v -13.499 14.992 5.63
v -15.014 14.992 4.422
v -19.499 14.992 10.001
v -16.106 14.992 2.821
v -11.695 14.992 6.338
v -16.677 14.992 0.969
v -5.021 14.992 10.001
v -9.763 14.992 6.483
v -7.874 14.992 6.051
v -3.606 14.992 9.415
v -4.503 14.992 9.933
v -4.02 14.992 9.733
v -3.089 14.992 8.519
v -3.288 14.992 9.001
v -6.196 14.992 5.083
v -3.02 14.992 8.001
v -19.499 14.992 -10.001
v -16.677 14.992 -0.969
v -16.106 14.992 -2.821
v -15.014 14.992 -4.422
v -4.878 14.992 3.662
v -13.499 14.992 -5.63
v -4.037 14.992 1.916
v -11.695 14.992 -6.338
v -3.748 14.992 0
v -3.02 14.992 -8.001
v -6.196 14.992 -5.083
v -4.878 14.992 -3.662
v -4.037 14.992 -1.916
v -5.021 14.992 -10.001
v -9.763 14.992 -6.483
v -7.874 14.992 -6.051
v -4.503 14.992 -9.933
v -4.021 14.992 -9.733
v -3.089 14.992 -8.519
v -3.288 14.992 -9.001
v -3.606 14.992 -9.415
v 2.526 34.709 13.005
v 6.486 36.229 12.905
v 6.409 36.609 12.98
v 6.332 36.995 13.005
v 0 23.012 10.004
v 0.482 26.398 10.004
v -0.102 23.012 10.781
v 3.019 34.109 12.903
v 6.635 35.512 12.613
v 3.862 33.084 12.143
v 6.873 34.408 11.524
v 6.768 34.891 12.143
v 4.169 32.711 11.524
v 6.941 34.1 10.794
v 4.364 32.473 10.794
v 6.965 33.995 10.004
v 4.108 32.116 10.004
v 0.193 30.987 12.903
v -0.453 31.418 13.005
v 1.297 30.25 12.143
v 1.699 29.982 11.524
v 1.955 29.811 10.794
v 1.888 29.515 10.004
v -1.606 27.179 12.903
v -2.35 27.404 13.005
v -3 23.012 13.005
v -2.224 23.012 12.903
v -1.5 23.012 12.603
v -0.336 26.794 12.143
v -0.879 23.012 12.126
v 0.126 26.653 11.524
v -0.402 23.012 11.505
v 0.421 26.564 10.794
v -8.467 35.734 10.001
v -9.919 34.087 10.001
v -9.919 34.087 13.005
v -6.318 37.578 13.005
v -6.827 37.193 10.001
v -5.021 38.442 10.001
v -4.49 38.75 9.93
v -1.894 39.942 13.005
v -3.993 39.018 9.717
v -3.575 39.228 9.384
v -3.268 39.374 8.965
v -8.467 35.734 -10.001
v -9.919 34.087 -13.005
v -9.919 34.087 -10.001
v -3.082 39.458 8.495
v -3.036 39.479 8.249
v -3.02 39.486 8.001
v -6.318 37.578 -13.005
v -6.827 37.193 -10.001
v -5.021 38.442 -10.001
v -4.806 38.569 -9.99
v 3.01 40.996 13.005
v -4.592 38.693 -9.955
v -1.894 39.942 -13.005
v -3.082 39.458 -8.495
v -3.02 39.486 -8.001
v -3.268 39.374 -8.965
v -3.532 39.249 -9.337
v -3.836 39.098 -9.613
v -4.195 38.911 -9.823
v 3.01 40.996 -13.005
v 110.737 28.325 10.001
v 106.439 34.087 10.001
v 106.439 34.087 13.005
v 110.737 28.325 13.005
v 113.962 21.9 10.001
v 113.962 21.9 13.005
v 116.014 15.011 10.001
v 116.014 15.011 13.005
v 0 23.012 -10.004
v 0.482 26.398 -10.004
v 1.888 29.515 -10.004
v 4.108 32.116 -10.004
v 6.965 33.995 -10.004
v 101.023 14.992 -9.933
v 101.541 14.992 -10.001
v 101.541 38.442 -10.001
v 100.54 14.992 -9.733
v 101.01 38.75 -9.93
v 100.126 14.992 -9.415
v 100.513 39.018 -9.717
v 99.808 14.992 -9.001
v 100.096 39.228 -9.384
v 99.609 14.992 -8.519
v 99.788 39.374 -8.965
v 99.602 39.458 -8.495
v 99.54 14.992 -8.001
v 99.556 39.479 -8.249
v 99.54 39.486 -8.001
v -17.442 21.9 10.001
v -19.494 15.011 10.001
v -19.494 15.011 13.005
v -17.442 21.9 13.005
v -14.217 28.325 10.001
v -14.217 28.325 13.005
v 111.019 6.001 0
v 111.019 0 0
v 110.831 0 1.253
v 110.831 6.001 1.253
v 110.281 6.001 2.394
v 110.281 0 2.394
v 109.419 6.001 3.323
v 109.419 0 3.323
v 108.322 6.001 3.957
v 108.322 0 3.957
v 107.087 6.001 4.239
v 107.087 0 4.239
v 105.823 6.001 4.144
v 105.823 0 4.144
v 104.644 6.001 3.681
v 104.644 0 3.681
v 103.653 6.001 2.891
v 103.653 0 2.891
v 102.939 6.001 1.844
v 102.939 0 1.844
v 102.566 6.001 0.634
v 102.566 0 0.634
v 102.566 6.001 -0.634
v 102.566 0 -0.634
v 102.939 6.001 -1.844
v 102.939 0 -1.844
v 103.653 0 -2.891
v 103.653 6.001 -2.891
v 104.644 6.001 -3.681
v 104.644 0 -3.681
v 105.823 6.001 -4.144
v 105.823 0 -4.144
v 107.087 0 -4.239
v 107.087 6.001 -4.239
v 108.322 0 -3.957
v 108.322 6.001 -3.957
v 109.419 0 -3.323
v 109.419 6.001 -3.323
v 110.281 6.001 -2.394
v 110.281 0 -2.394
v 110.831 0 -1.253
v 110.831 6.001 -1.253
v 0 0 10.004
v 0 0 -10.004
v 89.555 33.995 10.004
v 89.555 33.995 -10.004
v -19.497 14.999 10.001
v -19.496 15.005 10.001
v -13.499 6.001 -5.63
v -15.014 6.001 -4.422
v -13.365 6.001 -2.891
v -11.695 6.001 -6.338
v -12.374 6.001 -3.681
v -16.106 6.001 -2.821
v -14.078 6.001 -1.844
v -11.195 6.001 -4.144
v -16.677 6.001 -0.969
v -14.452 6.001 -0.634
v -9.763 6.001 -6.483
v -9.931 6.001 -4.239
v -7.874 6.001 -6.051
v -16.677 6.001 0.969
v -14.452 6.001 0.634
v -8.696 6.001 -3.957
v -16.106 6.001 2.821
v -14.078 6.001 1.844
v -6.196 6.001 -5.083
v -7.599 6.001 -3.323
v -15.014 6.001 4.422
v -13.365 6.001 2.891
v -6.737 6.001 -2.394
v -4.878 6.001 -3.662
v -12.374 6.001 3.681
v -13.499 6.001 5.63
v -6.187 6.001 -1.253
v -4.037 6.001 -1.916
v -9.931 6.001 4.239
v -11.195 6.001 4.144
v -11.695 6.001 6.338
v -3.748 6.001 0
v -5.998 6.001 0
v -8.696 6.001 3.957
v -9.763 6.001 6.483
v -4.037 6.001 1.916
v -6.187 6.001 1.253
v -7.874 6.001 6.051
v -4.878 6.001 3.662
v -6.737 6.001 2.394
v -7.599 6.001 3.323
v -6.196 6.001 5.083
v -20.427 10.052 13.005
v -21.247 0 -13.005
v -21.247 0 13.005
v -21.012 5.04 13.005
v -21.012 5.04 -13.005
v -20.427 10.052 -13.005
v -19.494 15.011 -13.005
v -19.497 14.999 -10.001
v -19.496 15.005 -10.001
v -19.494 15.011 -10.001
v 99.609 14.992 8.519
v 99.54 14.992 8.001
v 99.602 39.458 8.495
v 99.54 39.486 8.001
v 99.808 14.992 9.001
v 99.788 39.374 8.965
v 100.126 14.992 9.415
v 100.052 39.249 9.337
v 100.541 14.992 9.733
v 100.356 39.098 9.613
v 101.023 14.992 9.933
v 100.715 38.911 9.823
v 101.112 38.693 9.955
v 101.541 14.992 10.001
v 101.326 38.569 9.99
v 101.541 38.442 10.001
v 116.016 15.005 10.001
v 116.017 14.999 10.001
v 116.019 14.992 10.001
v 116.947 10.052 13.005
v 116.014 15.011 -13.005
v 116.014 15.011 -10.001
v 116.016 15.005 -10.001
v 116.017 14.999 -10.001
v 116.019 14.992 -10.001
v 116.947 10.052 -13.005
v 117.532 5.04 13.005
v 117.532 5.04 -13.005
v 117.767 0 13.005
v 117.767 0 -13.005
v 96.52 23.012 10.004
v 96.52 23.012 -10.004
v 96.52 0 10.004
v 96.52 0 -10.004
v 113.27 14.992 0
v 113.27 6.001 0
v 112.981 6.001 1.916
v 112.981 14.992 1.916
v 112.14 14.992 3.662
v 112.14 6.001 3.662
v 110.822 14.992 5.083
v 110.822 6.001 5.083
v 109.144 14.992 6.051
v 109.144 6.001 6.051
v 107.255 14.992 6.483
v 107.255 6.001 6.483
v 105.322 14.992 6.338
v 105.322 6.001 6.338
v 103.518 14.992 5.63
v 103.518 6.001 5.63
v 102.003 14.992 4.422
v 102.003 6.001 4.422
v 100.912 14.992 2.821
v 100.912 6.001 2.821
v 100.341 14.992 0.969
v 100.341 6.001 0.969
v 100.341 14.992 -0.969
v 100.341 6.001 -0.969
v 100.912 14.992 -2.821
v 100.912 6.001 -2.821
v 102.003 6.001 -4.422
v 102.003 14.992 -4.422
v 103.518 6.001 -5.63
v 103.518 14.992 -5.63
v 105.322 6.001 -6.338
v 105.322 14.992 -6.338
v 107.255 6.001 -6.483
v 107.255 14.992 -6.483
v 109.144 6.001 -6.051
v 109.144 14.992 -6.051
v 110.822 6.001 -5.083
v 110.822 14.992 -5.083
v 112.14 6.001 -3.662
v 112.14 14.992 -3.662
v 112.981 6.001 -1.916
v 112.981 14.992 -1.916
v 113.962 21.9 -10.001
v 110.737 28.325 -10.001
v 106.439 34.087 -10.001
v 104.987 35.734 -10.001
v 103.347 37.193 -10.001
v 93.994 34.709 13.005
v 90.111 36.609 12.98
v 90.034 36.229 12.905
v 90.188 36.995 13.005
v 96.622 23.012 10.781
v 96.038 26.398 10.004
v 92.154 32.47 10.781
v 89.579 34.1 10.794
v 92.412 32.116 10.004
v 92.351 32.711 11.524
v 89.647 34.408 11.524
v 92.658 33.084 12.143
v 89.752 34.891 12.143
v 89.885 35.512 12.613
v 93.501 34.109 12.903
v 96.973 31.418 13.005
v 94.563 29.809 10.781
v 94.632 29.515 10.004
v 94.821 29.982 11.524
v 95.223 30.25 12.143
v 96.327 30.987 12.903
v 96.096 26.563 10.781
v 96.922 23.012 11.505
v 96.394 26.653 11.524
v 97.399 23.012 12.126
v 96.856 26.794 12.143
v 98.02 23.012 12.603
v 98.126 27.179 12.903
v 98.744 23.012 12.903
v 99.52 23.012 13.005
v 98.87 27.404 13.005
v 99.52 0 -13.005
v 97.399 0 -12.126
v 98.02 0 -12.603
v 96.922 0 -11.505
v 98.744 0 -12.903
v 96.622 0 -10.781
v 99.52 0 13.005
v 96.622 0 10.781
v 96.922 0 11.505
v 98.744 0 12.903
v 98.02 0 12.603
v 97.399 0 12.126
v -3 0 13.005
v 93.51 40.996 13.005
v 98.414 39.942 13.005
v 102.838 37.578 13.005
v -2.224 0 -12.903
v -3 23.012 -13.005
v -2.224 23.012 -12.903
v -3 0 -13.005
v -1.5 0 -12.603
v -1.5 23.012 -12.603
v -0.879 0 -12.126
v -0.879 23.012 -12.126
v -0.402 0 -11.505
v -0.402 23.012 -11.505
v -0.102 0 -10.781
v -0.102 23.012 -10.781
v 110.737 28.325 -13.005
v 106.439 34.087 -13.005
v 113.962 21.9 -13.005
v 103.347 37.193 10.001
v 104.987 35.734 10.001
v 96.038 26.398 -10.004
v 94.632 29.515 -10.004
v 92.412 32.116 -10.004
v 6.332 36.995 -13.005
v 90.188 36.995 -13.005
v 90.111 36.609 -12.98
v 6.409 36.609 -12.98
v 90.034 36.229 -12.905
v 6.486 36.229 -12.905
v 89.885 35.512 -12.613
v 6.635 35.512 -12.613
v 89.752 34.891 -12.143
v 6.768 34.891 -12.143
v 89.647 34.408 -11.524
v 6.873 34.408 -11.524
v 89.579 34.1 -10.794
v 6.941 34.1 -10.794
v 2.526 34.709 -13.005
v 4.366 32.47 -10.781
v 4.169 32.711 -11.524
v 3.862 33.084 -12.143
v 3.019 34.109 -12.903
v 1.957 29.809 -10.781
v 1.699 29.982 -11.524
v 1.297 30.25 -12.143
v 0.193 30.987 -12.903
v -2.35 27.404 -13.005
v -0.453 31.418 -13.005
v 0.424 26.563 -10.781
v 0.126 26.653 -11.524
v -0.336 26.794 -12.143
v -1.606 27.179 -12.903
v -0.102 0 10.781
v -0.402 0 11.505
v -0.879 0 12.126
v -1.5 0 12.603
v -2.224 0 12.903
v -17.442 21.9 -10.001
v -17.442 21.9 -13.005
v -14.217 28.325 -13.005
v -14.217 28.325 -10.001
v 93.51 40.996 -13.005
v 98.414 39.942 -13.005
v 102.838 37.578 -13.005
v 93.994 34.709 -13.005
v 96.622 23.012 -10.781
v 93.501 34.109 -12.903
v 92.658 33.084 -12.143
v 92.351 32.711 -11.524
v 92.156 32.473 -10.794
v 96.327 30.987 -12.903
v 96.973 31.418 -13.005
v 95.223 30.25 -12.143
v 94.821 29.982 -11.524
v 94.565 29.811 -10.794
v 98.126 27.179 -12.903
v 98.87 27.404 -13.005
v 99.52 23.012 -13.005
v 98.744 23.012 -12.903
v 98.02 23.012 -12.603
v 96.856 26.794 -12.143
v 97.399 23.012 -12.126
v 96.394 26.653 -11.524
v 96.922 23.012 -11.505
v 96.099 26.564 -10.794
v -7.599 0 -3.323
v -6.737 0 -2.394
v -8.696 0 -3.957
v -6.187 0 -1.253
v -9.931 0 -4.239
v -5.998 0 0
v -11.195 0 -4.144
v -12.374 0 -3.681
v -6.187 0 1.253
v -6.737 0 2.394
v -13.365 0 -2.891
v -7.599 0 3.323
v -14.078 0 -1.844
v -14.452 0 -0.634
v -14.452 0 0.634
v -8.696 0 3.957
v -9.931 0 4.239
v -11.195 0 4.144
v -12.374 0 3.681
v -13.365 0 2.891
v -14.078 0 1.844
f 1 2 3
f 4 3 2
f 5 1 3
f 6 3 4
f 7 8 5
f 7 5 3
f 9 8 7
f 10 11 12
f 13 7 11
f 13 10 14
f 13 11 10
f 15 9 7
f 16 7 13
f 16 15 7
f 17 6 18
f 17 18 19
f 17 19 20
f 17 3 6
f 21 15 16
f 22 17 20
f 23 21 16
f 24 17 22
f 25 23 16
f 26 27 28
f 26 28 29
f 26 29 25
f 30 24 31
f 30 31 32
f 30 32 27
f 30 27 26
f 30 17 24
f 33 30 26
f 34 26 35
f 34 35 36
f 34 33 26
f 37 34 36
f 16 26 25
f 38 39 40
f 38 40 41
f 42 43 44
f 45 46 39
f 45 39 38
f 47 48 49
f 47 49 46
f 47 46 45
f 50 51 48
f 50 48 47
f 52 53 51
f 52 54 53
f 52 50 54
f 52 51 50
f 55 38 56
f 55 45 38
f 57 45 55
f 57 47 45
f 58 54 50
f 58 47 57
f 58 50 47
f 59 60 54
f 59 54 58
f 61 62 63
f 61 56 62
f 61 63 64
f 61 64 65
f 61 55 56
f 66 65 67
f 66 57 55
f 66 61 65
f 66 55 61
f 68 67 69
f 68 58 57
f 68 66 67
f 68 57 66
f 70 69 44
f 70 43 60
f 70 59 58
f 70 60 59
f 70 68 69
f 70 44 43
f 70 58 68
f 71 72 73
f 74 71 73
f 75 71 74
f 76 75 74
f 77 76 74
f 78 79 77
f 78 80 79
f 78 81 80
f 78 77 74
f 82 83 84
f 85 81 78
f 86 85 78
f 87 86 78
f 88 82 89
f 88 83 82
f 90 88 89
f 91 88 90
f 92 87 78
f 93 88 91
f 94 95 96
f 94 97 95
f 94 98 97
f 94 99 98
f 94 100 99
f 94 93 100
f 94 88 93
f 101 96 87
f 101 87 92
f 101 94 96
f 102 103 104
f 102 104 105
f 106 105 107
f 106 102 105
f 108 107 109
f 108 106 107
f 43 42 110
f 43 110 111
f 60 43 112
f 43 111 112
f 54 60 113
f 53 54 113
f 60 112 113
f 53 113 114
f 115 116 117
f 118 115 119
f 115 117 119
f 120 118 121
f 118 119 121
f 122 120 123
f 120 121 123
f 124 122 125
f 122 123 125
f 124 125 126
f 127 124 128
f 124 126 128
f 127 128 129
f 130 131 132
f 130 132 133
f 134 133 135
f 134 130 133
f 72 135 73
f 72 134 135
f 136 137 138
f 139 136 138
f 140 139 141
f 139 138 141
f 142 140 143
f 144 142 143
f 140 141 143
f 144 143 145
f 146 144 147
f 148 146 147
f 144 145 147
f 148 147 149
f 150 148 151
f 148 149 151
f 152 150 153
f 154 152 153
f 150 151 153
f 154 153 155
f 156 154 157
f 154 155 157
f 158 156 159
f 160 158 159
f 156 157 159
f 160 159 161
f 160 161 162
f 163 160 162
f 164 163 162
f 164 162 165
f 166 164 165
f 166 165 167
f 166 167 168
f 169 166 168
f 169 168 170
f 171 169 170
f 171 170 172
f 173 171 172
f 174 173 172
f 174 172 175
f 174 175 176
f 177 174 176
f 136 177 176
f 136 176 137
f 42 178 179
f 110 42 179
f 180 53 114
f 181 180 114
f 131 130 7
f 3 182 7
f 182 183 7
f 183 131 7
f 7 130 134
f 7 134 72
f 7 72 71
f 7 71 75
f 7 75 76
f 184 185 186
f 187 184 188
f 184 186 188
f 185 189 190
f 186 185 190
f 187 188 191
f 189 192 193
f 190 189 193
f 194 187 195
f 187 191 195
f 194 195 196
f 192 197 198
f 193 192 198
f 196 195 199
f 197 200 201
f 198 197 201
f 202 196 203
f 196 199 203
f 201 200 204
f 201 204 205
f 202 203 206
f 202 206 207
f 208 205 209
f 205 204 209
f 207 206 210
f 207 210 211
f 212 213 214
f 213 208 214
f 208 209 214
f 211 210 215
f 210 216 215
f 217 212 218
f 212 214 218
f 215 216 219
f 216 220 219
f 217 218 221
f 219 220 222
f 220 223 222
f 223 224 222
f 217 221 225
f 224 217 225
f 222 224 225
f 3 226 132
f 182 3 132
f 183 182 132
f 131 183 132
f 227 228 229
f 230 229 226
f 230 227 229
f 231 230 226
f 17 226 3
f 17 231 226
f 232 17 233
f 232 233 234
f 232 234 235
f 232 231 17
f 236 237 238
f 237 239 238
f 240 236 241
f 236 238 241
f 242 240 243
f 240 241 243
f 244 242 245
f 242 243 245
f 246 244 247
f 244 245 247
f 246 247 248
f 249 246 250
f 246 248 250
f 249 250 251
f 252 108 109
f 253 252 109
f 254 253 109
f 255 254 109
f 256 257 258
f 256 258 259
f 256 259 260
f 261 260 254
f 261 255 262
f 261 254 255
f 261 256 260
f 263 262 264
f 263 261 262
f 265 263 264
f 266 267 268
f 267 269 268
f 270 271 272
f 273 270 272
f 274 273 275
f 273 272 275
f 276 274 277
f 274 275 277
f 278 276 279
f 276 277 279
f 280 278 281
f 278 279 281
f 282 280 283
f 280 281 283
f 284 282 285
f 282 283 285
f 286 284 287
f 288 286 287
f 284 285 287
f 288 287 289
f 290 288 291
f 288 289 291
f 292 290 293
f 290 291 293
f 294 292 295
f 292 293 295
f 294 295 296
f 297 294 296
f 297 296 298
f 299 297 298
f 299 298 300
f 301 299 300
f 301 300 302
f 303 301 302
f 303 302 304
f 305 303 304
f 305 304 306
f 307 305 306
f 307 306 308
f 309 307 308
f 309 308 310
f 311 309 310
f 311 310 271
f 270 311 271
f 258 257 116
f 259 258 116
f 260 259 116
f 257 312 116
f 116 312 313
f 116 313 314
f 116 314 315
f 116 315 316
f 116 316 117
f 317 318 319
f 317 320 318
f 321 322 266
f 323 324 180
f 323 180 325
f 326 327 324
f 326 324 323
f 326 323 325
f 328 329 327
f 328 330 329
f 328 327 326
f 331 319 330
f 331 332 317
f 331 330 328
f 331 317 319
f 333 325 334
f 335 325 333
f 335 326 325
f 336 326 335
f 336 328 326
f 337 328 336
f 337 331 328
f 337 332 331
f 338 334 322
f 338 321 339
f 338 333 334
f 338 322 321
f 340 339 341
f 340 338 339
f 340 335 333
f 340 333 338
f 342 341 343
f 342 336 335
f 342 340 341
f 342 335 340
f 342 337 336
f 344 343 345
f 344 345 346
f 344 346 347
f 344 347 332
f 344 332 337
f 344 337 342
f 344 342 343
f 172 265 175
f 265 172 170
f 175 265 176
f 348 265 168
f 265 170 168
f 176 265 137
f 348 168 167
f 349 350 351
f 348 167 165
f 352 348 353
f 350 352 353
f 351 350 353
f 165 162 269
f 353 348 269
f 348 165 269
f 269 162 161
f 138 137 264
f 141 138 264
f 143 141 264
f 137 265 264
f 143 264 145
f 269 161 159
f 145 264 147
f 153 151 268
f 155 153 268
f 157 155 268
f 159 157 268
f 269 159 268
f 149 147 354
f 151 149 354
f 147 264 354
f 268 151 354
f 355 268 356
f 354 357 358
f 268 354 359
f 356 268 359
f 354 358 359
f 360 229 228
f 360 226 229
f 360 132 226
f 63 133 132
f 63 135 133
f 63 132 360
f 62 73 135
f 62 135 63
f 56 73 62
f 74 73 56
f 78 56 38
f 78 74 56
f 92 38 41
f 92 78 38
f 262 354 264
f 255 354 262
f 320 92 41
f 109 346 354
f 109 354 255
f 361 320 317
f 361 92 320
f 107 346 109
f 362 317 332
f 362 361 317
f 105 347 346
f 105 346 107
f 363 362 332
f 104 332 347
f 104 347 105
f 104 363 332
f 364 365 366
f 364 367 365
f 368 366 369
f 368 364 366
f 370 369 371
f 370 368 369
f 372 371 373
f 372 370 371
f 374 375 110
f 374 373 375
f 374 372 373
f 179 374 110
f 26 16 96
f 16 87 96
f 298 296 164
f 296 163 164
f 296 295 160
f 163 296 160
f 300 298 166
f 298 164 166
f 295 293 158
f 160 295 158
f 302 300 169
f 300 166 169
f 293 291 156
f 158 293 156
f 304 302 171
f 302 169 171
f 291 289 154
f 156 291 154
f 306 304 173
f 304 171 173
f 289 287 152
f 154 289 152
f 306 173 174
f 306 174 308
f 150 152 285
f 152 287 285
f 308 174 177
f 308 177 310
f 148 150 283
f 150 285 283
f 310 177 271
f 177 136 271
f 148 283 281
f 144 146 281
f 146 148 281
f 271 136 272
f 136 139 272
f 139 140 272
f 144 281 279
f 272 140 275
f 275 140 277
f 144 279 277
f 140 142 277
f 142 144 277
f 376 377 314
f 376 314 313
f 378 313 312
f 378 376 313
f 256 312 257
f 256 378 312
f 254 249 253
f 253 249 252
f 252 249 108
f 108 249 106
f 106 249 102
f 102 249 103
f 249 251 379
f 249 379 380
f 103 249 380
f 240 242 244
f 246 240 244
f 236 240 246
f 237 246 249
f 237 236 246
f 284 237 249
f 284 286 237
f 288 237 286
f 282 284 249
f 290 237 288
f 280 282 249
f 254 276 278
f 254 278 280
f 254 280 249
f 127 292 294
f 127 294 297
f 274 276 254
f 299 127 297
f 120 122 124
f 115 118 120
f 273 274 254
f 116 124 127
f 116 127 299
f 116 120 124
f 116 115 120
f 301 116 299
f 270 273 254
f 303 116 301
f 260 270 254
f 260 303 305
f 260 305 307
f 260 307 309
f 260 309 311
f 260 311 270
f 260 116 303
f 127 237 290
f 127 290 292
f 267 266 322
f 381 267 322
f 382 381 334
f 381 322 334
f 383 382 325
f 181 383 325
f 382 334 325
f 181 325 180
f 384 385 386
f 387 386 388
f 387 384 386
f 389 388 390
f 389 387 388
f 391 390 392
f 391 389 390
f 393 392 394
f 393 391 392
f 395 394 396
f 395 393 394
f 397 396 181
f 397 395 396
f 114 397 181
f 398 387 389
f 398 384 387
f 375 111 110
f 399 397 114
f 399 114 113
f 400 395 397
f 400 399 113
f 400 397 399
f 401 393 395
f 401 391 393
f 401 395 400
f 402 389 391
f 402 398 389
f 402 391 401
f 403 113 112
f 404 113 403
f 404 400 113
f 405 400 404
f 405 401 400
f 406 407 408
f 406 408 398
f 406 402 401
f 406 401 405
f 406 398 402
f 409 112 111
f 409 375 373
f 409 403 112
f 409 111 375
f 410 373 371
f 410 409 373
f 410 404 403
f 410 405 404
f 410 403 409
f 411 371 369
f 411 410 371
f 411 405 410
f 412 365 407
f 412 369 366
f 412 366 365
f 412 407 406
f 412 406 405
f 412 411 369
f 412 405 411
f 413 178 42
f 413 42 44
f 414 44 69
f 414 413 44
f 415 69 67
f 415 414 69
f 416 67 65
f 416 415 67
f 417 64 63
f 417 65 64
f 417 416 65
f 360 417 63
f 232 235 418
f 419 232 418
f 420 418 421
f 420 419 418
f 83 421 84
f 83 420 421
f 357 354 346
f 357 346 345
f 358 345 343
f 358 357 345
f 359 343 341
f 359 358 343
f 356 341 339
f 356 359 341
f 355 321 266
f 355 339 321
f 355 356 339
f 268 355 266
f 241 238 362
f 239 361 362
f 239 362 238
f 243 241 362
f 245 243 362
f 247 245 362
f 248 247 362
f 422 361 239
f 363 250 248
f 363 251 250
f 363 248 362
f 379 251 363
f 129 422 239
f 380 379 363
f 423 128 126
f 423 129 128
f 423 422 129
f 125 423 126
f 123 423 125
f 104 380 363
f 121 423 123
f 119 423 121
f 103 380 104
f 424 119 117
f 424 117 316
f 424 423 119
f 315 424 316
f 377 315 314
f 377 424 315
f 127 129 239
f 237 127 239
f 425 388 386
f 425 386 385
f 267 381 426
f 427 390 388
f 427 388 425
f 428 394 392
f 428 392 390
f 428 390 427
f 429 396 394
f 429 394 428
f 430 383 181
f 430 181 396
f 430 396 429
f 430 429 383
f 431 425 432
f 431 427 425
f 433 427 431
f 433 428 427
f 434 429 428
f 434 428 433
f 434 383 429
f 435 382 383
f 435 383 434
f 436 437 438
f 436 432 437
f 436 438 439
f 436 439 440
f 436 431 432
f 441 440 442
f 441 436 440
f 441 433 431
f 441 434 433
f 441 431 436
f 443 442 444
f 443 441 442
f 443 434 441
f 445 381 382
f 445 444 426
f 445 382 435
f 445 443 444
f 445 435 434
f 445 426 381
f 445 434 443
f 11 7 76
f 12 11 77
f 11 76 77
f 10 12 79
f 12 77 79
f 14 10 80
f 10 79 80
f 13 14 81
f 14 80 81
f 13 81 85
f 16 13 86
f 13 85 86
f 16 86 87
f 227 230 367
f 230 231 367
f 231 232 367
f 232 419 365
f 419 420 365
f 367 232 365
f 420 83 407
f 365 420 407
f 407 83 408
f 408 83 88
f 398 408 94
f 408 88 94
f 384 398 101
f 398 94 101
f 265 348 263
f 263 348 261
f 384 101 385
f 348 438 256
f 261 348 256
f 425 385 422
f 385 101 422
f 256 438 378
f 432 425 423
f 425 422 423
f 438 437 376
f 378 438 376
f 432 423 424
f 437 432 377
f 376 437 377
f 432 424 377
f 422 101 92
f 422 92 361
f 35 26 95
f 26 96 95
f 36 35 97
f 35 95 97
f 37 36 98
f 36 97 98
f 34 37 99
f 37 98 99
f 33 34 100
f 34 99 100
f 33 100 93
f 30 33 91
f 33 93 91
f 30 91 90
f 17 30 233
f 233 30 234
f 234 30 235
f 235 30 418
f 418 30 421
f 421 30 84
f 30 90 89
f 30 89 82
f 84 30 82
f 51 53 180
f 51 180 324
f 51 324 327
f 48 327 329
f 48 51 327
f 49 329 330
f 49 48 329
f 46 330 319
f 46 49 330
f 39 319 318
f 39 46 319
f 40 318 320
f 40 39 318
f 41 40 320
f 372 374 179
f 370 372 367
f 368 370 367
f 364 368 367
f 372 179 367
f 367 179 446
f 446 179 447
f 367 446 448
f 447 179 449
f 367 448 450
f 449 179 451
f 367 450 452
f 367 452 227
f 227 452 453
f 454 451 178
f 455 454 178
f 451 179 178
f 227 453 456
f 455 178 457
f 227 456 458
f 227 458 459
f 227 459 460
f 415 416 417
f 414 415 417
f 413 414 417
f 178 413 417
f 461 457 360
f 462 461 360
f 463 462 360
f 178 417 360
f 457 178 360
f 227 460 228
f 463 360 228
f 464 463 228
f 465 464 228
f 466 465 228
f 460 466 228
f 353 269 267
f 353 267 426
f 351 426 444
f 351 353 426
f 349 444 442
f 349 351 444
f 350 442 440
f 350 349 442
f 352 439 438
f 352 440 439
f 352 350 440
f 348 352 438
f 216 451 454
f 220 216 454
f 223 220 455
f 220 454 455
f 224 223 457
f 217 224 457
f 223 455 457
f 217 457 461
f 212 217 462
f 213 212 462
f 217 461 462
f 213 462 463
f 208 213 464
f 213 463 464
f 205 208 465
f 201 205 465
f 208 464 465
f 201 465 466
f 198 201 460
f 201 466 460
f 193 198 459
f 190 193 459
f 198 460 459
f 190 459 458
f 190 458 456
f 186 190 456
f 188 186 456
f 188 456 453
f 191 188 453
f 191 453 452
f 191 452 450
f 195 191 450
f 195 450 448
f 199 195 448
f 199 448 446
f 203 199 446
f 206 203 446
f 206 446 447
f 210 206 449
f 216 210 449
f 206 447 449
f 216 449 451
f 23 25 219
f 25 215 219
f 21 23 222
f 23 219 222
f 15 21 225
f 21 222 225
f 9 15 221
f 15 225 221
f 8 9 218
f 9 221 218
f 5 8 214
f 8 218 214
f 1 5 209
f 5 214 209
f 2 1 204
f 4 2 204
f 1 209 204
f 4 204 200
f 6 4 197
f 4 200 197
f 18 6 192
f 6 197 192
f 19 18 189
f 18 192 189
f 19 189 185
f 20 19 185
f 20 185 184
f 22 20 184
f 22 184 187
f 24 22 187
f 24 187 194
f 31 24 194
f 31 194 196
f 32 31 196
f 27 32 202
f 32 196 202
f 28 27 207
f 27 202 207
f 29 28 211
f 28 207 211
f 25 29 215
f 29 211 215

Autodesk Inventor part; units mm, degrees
ref_plane "YZ Plane" through (0, 0, 0) normal (1, 0, 0) x (0, 1, 0)
ref_plane "XZ Plane" through (0, 0, 0) normal (0, 1, 0) x (-1, 0, 0)
ref_plane "XY Plane" through (0, 0, 0) normal (0, 0, 1) x (1, 0, 0)
sketch "Sketch_10" plane through (0, 0, 0) normal (0, 1, 0) x (-1, 0, 0)
  line L0 (21.2471, -13.0048) -> (21.2471, 13.0048)
  line L1 (21.2471, 13.0048) -> (3.0004, 13.0048)
  arc A0 (3.0004, 13.0048) -> (0, 10.0044) centre (3.0004, 10.0044) ccw
  line L2 (0, 10.0044) -> (0, -10.0044)
  arc A1 (0, -10.0044) -> (3.0004, -13.0048) centre (3.0004, -10.0044) ccw
  line L3 (3.0004, -13.0048) -> (21.2471, -13.0048)
extrude "Extrusion1" add sketch "Sketch_10" along normal blind 40.9956
sketch "Sketch_11" plane through (-21.2471, 0, 0) normal (1, 0, 0) x (0, 0, -1)
  arc A0 (-13.0048, 36.9951) -> (-10.0044, 33.9947) centre (-10.0044, 36.9951) ccw
  line L0 (-10.0044, 33.9947) -> (10.0044, 33.9947)
  arc A1 (10.0044, 33.9947) -> (13.0048, 36.9951) centre (10.0044, 36.9951) ccw
  line L1 (13.0048, 36.9951) -> (13.0048, 55.2418)
  line L2 (13.0048, 55.2418) -> (-13.0048, 55.2418)
  line L3 (-13.0048, 55.2418) -> (-13.0048, 36.9951)
extrude "Extrusion2" add sketch "Sketch_11" along normal blind 139.0142
sketch "Sketch_12" plane through (0, 0, 0) normal (0, 1, 0) x (-1, 0, 0)
  arc A0 (-96.52, 10.0044) -> (-99.5204, 13.0048) centre (-99.5204, 10.0044) ccw
  line L0 (-99.5204, 13.0048) -> (-117.7671, 13.0048)
  line L1 (-117.7671, 13.0048) -> (-117.7671, -13.0048)
  line L2 (-117.7671, -13.0048) -> (-99.5204, -13.0048)
  arc A1 (-99.5204, -13.0048) -> (-96.52, -10.0044) centre (-99.5204, -10.0044) ccw
  line L3 (-96.52, -10.0044) -> (-96.52, 10.0044)
extrude "Extrusion3" add sketch "Sketch_12" along normal blind 40.9956
sketch "Sketch_13" plane through (0, 23.0124, 0) normal (0, 1, 0) x (1, 0, 0)
  line L0 (12.1412, 10.0044) -> (12.1412, -10.0044)
  line L1 (-21.2471, 13.0048) -> (-21.2471, -13.0048)
  line L2 (-21.2471, -13.0048) -> (-3.0004, -13.0048)
  arc A0 (-3.0004, -13.0048) -> (0, -10.0044) centre (-3.0004, -10.0044) ccw
  line L3 (0, -10.0044) -> (0, 10.0044)
  arc A1 (0, 10.0044) -> (-3.0004, 13.0048) centre (-3.0004, 10.0044) ccw
  line L4 (-3.0004, 13.0048) -> (-21.2471, 13.0048)
revolve "Revolution1" add sketch "Sketch_13" angle 90 about axis through (12.1412, 23.0124, -10.0044) along (0, 0, -1)
sketch "Sketch_14" plane through (0, 23.0124, 0) normal (0, 1, 0) x (1, 0, 0)
  line L0 (84.3788, -10.0044) -> (84.3788, 10.0044)
  arc A0 (96.52, -10.0044) -> (99.5204, -13.0048) centre (99.5204, -10.0044) ccw
  line L1 (99.5204, -13.0048) -> (117.7671, -13.0048)
  line L2 (117.7671, -13.0048) -> (117.7671, 13.0048)
  line L3 (117.7671, 13.0048) -> (99.5204, 13.0048)
  arc A1 (99.5204, 13.0048) -> (96.52, 10.0044) centre (99.5204, 10.0044) ccw
  line L4 (96.52, 10.0044) -> (96.52, -10.0044)
revolve "Revolution2" add sketch "Sketch_14" angle 90 about axis through (84.3788, 23.0124, 10.0044) along (0, 0, 1)
sketch "Sketch_15" plane through (0, 0, 0) normal (0, 0, 1) x (1, 0, 0)
  line L0 (-33.9471, 81.9912) -> (-33.9471, 0)
  line L1 (-33.9471, 0) -> (-21.2471, 0)
  arc A0 (-19.4945, 15.0114) -> (-21.2471, 0) centre (51.2063, -0.851) ccw
  arc A1 (-9.9187, 34.0868) -> (-19.4945, 15.0114) centre (20.6584, 6.796) ccw
  arc A2 (3.0099, 40.9956) -> (-9.9187, 34.0868) centre (4.3058, 23.0194) ccw
  line L2 (3.0099, 40.9956) -> (93.5101, 40.9956)
  arc A3 (106.4387, 34.0868) -> (93.5101, 40.9956) centre (92.2142, 23.0194) ccw
  arc A4 (116.0145, 15.0114) -> (106.4387, 34.0868) centre (75.8616, 6.796) ccw
  arc A5 (117.7671, 0) -> (116.0145, 15.0114) centre (45.3137, -0.851) ccw
  line L3 (117.7671, 0) -> (130.4671, 0)
  line L4 (130.4671, 0) -> (130.4671, 81.9912)
  line L5 (130.4671, 81.9912) -> (-33.9471, 81.9912)
extrude "Extrusion4" cut sketch "Sketch_15" along normal mid plane 52.0192
sketch "Sketch_16" plane through (0, 0, 0) normal (0, 0, 1) x (1, 0, 0)
  line L0 (106.7689, 0) -> (106.7689, 40.9956)
  line L1 (106.7689, 40.9956) -> (113.2697, 40.9956)
  line L2 (113.2697, 40.9956) -> (113.2697, 6.0008)
  line L3 (113.2697, 6.0008) -> (111.0194, 6.0008)
  line L4 (111.0194, 6.0008) -> (111.0194, 0)
  line L5 (111.0194, 0) -> (106.7689, 0)
  line L6 (106.7689, 0) -> (106.7689, 40.9956)
revolve "Revolution3" cut sketch "Sketch_16" angle 360 about axis through (106.7689, 0, 0) along (0, -1, 0)
sketch "Sketch_17" plane through (0, 0, 0) normal (0, 0, 1) x (1, 0, 0)
  line L0 (-10.2489, 0) -> (-10.2489, 40.9956)
  line L1 (-10.2489, 40.9956) -> (-3.7481, 40.9956)
  line L2 (-3.7481, 40.9956) -> (-3.7481, 6.0008)
  line L3 (-3.7481, 6.0008) -> (-5.9984, 6.0008)
  line L4 (-5.9984, 6.0008) -> (-5.9984, 0)
  line L5 (-5.9984, 0) -> (-10.2489, 0)
  line L6 (-10.2489, 0) -> (-10.2489, 40.9956)
revolve "Revolution4" cut sketch "Sketch_17" angle 360 about axis through (-10.2489, 0, 0) along (0, -1, 0)
sketch "Sketch_18" plane through (0, 40.9956, 0) normal (0, 1, 0) x (1, 0, 0)
  line L0 (-33.9471, 25.7048) -> (-33.9471, -10.0013)
  line L1 (-33.9471, -10.0013) -> (-5.0206, -10.0013)
  arc A0 (-5.0206, -10.0013) -> (-3.0204, -8.001) centre (-5.0206, -8.001) ccw
  line L2 (-3.0204, -8.001) -> (-3.0204, 8.001)
  arc A1 (-3.0204, 8.001) -> (-5.0206, 10.0013) centre (-5.0206, 8.001) ccw
  line L3 (-5.0206, 10.0013) -> (-21.2471, 10.0013)
  line L4 (-21.2471, 10.0013) -> (-21.2471, 13.0048)
  line L5 (-21.2471, 13.0048) -> (117.7671, 13.0048)
  line L6 (117.7671, 13.0048) -> (117.7671, 10.0013)
  line L7 (117.7671, 10.0013) -> (101.5406, 10.0013)
  arc A2 (101.5406, 10.0013) -> (99.5404, 8.001) centre (101.5406, 8.001) ccw
  line L8 (99.5404, 8.001) -> (99.5404, -8.001)
  arc A3 (99.5404, -8.001) -> (101.5406, -10.0013) centre (101.5406, -8.001) ccw
  line L9 (101.5406, -10.0013) -> (130.4671, -10.0013)
  line L10 (130.4671, -10.0013) -> (130.4671, 25.7048)
  line L11 (130.4671, 25.7048) -> (-33.9471, 25.7048)
extrude "Extrusion5" cut sketch "Sketch_18" against normal blind 26.0032
properties part number "2061"
